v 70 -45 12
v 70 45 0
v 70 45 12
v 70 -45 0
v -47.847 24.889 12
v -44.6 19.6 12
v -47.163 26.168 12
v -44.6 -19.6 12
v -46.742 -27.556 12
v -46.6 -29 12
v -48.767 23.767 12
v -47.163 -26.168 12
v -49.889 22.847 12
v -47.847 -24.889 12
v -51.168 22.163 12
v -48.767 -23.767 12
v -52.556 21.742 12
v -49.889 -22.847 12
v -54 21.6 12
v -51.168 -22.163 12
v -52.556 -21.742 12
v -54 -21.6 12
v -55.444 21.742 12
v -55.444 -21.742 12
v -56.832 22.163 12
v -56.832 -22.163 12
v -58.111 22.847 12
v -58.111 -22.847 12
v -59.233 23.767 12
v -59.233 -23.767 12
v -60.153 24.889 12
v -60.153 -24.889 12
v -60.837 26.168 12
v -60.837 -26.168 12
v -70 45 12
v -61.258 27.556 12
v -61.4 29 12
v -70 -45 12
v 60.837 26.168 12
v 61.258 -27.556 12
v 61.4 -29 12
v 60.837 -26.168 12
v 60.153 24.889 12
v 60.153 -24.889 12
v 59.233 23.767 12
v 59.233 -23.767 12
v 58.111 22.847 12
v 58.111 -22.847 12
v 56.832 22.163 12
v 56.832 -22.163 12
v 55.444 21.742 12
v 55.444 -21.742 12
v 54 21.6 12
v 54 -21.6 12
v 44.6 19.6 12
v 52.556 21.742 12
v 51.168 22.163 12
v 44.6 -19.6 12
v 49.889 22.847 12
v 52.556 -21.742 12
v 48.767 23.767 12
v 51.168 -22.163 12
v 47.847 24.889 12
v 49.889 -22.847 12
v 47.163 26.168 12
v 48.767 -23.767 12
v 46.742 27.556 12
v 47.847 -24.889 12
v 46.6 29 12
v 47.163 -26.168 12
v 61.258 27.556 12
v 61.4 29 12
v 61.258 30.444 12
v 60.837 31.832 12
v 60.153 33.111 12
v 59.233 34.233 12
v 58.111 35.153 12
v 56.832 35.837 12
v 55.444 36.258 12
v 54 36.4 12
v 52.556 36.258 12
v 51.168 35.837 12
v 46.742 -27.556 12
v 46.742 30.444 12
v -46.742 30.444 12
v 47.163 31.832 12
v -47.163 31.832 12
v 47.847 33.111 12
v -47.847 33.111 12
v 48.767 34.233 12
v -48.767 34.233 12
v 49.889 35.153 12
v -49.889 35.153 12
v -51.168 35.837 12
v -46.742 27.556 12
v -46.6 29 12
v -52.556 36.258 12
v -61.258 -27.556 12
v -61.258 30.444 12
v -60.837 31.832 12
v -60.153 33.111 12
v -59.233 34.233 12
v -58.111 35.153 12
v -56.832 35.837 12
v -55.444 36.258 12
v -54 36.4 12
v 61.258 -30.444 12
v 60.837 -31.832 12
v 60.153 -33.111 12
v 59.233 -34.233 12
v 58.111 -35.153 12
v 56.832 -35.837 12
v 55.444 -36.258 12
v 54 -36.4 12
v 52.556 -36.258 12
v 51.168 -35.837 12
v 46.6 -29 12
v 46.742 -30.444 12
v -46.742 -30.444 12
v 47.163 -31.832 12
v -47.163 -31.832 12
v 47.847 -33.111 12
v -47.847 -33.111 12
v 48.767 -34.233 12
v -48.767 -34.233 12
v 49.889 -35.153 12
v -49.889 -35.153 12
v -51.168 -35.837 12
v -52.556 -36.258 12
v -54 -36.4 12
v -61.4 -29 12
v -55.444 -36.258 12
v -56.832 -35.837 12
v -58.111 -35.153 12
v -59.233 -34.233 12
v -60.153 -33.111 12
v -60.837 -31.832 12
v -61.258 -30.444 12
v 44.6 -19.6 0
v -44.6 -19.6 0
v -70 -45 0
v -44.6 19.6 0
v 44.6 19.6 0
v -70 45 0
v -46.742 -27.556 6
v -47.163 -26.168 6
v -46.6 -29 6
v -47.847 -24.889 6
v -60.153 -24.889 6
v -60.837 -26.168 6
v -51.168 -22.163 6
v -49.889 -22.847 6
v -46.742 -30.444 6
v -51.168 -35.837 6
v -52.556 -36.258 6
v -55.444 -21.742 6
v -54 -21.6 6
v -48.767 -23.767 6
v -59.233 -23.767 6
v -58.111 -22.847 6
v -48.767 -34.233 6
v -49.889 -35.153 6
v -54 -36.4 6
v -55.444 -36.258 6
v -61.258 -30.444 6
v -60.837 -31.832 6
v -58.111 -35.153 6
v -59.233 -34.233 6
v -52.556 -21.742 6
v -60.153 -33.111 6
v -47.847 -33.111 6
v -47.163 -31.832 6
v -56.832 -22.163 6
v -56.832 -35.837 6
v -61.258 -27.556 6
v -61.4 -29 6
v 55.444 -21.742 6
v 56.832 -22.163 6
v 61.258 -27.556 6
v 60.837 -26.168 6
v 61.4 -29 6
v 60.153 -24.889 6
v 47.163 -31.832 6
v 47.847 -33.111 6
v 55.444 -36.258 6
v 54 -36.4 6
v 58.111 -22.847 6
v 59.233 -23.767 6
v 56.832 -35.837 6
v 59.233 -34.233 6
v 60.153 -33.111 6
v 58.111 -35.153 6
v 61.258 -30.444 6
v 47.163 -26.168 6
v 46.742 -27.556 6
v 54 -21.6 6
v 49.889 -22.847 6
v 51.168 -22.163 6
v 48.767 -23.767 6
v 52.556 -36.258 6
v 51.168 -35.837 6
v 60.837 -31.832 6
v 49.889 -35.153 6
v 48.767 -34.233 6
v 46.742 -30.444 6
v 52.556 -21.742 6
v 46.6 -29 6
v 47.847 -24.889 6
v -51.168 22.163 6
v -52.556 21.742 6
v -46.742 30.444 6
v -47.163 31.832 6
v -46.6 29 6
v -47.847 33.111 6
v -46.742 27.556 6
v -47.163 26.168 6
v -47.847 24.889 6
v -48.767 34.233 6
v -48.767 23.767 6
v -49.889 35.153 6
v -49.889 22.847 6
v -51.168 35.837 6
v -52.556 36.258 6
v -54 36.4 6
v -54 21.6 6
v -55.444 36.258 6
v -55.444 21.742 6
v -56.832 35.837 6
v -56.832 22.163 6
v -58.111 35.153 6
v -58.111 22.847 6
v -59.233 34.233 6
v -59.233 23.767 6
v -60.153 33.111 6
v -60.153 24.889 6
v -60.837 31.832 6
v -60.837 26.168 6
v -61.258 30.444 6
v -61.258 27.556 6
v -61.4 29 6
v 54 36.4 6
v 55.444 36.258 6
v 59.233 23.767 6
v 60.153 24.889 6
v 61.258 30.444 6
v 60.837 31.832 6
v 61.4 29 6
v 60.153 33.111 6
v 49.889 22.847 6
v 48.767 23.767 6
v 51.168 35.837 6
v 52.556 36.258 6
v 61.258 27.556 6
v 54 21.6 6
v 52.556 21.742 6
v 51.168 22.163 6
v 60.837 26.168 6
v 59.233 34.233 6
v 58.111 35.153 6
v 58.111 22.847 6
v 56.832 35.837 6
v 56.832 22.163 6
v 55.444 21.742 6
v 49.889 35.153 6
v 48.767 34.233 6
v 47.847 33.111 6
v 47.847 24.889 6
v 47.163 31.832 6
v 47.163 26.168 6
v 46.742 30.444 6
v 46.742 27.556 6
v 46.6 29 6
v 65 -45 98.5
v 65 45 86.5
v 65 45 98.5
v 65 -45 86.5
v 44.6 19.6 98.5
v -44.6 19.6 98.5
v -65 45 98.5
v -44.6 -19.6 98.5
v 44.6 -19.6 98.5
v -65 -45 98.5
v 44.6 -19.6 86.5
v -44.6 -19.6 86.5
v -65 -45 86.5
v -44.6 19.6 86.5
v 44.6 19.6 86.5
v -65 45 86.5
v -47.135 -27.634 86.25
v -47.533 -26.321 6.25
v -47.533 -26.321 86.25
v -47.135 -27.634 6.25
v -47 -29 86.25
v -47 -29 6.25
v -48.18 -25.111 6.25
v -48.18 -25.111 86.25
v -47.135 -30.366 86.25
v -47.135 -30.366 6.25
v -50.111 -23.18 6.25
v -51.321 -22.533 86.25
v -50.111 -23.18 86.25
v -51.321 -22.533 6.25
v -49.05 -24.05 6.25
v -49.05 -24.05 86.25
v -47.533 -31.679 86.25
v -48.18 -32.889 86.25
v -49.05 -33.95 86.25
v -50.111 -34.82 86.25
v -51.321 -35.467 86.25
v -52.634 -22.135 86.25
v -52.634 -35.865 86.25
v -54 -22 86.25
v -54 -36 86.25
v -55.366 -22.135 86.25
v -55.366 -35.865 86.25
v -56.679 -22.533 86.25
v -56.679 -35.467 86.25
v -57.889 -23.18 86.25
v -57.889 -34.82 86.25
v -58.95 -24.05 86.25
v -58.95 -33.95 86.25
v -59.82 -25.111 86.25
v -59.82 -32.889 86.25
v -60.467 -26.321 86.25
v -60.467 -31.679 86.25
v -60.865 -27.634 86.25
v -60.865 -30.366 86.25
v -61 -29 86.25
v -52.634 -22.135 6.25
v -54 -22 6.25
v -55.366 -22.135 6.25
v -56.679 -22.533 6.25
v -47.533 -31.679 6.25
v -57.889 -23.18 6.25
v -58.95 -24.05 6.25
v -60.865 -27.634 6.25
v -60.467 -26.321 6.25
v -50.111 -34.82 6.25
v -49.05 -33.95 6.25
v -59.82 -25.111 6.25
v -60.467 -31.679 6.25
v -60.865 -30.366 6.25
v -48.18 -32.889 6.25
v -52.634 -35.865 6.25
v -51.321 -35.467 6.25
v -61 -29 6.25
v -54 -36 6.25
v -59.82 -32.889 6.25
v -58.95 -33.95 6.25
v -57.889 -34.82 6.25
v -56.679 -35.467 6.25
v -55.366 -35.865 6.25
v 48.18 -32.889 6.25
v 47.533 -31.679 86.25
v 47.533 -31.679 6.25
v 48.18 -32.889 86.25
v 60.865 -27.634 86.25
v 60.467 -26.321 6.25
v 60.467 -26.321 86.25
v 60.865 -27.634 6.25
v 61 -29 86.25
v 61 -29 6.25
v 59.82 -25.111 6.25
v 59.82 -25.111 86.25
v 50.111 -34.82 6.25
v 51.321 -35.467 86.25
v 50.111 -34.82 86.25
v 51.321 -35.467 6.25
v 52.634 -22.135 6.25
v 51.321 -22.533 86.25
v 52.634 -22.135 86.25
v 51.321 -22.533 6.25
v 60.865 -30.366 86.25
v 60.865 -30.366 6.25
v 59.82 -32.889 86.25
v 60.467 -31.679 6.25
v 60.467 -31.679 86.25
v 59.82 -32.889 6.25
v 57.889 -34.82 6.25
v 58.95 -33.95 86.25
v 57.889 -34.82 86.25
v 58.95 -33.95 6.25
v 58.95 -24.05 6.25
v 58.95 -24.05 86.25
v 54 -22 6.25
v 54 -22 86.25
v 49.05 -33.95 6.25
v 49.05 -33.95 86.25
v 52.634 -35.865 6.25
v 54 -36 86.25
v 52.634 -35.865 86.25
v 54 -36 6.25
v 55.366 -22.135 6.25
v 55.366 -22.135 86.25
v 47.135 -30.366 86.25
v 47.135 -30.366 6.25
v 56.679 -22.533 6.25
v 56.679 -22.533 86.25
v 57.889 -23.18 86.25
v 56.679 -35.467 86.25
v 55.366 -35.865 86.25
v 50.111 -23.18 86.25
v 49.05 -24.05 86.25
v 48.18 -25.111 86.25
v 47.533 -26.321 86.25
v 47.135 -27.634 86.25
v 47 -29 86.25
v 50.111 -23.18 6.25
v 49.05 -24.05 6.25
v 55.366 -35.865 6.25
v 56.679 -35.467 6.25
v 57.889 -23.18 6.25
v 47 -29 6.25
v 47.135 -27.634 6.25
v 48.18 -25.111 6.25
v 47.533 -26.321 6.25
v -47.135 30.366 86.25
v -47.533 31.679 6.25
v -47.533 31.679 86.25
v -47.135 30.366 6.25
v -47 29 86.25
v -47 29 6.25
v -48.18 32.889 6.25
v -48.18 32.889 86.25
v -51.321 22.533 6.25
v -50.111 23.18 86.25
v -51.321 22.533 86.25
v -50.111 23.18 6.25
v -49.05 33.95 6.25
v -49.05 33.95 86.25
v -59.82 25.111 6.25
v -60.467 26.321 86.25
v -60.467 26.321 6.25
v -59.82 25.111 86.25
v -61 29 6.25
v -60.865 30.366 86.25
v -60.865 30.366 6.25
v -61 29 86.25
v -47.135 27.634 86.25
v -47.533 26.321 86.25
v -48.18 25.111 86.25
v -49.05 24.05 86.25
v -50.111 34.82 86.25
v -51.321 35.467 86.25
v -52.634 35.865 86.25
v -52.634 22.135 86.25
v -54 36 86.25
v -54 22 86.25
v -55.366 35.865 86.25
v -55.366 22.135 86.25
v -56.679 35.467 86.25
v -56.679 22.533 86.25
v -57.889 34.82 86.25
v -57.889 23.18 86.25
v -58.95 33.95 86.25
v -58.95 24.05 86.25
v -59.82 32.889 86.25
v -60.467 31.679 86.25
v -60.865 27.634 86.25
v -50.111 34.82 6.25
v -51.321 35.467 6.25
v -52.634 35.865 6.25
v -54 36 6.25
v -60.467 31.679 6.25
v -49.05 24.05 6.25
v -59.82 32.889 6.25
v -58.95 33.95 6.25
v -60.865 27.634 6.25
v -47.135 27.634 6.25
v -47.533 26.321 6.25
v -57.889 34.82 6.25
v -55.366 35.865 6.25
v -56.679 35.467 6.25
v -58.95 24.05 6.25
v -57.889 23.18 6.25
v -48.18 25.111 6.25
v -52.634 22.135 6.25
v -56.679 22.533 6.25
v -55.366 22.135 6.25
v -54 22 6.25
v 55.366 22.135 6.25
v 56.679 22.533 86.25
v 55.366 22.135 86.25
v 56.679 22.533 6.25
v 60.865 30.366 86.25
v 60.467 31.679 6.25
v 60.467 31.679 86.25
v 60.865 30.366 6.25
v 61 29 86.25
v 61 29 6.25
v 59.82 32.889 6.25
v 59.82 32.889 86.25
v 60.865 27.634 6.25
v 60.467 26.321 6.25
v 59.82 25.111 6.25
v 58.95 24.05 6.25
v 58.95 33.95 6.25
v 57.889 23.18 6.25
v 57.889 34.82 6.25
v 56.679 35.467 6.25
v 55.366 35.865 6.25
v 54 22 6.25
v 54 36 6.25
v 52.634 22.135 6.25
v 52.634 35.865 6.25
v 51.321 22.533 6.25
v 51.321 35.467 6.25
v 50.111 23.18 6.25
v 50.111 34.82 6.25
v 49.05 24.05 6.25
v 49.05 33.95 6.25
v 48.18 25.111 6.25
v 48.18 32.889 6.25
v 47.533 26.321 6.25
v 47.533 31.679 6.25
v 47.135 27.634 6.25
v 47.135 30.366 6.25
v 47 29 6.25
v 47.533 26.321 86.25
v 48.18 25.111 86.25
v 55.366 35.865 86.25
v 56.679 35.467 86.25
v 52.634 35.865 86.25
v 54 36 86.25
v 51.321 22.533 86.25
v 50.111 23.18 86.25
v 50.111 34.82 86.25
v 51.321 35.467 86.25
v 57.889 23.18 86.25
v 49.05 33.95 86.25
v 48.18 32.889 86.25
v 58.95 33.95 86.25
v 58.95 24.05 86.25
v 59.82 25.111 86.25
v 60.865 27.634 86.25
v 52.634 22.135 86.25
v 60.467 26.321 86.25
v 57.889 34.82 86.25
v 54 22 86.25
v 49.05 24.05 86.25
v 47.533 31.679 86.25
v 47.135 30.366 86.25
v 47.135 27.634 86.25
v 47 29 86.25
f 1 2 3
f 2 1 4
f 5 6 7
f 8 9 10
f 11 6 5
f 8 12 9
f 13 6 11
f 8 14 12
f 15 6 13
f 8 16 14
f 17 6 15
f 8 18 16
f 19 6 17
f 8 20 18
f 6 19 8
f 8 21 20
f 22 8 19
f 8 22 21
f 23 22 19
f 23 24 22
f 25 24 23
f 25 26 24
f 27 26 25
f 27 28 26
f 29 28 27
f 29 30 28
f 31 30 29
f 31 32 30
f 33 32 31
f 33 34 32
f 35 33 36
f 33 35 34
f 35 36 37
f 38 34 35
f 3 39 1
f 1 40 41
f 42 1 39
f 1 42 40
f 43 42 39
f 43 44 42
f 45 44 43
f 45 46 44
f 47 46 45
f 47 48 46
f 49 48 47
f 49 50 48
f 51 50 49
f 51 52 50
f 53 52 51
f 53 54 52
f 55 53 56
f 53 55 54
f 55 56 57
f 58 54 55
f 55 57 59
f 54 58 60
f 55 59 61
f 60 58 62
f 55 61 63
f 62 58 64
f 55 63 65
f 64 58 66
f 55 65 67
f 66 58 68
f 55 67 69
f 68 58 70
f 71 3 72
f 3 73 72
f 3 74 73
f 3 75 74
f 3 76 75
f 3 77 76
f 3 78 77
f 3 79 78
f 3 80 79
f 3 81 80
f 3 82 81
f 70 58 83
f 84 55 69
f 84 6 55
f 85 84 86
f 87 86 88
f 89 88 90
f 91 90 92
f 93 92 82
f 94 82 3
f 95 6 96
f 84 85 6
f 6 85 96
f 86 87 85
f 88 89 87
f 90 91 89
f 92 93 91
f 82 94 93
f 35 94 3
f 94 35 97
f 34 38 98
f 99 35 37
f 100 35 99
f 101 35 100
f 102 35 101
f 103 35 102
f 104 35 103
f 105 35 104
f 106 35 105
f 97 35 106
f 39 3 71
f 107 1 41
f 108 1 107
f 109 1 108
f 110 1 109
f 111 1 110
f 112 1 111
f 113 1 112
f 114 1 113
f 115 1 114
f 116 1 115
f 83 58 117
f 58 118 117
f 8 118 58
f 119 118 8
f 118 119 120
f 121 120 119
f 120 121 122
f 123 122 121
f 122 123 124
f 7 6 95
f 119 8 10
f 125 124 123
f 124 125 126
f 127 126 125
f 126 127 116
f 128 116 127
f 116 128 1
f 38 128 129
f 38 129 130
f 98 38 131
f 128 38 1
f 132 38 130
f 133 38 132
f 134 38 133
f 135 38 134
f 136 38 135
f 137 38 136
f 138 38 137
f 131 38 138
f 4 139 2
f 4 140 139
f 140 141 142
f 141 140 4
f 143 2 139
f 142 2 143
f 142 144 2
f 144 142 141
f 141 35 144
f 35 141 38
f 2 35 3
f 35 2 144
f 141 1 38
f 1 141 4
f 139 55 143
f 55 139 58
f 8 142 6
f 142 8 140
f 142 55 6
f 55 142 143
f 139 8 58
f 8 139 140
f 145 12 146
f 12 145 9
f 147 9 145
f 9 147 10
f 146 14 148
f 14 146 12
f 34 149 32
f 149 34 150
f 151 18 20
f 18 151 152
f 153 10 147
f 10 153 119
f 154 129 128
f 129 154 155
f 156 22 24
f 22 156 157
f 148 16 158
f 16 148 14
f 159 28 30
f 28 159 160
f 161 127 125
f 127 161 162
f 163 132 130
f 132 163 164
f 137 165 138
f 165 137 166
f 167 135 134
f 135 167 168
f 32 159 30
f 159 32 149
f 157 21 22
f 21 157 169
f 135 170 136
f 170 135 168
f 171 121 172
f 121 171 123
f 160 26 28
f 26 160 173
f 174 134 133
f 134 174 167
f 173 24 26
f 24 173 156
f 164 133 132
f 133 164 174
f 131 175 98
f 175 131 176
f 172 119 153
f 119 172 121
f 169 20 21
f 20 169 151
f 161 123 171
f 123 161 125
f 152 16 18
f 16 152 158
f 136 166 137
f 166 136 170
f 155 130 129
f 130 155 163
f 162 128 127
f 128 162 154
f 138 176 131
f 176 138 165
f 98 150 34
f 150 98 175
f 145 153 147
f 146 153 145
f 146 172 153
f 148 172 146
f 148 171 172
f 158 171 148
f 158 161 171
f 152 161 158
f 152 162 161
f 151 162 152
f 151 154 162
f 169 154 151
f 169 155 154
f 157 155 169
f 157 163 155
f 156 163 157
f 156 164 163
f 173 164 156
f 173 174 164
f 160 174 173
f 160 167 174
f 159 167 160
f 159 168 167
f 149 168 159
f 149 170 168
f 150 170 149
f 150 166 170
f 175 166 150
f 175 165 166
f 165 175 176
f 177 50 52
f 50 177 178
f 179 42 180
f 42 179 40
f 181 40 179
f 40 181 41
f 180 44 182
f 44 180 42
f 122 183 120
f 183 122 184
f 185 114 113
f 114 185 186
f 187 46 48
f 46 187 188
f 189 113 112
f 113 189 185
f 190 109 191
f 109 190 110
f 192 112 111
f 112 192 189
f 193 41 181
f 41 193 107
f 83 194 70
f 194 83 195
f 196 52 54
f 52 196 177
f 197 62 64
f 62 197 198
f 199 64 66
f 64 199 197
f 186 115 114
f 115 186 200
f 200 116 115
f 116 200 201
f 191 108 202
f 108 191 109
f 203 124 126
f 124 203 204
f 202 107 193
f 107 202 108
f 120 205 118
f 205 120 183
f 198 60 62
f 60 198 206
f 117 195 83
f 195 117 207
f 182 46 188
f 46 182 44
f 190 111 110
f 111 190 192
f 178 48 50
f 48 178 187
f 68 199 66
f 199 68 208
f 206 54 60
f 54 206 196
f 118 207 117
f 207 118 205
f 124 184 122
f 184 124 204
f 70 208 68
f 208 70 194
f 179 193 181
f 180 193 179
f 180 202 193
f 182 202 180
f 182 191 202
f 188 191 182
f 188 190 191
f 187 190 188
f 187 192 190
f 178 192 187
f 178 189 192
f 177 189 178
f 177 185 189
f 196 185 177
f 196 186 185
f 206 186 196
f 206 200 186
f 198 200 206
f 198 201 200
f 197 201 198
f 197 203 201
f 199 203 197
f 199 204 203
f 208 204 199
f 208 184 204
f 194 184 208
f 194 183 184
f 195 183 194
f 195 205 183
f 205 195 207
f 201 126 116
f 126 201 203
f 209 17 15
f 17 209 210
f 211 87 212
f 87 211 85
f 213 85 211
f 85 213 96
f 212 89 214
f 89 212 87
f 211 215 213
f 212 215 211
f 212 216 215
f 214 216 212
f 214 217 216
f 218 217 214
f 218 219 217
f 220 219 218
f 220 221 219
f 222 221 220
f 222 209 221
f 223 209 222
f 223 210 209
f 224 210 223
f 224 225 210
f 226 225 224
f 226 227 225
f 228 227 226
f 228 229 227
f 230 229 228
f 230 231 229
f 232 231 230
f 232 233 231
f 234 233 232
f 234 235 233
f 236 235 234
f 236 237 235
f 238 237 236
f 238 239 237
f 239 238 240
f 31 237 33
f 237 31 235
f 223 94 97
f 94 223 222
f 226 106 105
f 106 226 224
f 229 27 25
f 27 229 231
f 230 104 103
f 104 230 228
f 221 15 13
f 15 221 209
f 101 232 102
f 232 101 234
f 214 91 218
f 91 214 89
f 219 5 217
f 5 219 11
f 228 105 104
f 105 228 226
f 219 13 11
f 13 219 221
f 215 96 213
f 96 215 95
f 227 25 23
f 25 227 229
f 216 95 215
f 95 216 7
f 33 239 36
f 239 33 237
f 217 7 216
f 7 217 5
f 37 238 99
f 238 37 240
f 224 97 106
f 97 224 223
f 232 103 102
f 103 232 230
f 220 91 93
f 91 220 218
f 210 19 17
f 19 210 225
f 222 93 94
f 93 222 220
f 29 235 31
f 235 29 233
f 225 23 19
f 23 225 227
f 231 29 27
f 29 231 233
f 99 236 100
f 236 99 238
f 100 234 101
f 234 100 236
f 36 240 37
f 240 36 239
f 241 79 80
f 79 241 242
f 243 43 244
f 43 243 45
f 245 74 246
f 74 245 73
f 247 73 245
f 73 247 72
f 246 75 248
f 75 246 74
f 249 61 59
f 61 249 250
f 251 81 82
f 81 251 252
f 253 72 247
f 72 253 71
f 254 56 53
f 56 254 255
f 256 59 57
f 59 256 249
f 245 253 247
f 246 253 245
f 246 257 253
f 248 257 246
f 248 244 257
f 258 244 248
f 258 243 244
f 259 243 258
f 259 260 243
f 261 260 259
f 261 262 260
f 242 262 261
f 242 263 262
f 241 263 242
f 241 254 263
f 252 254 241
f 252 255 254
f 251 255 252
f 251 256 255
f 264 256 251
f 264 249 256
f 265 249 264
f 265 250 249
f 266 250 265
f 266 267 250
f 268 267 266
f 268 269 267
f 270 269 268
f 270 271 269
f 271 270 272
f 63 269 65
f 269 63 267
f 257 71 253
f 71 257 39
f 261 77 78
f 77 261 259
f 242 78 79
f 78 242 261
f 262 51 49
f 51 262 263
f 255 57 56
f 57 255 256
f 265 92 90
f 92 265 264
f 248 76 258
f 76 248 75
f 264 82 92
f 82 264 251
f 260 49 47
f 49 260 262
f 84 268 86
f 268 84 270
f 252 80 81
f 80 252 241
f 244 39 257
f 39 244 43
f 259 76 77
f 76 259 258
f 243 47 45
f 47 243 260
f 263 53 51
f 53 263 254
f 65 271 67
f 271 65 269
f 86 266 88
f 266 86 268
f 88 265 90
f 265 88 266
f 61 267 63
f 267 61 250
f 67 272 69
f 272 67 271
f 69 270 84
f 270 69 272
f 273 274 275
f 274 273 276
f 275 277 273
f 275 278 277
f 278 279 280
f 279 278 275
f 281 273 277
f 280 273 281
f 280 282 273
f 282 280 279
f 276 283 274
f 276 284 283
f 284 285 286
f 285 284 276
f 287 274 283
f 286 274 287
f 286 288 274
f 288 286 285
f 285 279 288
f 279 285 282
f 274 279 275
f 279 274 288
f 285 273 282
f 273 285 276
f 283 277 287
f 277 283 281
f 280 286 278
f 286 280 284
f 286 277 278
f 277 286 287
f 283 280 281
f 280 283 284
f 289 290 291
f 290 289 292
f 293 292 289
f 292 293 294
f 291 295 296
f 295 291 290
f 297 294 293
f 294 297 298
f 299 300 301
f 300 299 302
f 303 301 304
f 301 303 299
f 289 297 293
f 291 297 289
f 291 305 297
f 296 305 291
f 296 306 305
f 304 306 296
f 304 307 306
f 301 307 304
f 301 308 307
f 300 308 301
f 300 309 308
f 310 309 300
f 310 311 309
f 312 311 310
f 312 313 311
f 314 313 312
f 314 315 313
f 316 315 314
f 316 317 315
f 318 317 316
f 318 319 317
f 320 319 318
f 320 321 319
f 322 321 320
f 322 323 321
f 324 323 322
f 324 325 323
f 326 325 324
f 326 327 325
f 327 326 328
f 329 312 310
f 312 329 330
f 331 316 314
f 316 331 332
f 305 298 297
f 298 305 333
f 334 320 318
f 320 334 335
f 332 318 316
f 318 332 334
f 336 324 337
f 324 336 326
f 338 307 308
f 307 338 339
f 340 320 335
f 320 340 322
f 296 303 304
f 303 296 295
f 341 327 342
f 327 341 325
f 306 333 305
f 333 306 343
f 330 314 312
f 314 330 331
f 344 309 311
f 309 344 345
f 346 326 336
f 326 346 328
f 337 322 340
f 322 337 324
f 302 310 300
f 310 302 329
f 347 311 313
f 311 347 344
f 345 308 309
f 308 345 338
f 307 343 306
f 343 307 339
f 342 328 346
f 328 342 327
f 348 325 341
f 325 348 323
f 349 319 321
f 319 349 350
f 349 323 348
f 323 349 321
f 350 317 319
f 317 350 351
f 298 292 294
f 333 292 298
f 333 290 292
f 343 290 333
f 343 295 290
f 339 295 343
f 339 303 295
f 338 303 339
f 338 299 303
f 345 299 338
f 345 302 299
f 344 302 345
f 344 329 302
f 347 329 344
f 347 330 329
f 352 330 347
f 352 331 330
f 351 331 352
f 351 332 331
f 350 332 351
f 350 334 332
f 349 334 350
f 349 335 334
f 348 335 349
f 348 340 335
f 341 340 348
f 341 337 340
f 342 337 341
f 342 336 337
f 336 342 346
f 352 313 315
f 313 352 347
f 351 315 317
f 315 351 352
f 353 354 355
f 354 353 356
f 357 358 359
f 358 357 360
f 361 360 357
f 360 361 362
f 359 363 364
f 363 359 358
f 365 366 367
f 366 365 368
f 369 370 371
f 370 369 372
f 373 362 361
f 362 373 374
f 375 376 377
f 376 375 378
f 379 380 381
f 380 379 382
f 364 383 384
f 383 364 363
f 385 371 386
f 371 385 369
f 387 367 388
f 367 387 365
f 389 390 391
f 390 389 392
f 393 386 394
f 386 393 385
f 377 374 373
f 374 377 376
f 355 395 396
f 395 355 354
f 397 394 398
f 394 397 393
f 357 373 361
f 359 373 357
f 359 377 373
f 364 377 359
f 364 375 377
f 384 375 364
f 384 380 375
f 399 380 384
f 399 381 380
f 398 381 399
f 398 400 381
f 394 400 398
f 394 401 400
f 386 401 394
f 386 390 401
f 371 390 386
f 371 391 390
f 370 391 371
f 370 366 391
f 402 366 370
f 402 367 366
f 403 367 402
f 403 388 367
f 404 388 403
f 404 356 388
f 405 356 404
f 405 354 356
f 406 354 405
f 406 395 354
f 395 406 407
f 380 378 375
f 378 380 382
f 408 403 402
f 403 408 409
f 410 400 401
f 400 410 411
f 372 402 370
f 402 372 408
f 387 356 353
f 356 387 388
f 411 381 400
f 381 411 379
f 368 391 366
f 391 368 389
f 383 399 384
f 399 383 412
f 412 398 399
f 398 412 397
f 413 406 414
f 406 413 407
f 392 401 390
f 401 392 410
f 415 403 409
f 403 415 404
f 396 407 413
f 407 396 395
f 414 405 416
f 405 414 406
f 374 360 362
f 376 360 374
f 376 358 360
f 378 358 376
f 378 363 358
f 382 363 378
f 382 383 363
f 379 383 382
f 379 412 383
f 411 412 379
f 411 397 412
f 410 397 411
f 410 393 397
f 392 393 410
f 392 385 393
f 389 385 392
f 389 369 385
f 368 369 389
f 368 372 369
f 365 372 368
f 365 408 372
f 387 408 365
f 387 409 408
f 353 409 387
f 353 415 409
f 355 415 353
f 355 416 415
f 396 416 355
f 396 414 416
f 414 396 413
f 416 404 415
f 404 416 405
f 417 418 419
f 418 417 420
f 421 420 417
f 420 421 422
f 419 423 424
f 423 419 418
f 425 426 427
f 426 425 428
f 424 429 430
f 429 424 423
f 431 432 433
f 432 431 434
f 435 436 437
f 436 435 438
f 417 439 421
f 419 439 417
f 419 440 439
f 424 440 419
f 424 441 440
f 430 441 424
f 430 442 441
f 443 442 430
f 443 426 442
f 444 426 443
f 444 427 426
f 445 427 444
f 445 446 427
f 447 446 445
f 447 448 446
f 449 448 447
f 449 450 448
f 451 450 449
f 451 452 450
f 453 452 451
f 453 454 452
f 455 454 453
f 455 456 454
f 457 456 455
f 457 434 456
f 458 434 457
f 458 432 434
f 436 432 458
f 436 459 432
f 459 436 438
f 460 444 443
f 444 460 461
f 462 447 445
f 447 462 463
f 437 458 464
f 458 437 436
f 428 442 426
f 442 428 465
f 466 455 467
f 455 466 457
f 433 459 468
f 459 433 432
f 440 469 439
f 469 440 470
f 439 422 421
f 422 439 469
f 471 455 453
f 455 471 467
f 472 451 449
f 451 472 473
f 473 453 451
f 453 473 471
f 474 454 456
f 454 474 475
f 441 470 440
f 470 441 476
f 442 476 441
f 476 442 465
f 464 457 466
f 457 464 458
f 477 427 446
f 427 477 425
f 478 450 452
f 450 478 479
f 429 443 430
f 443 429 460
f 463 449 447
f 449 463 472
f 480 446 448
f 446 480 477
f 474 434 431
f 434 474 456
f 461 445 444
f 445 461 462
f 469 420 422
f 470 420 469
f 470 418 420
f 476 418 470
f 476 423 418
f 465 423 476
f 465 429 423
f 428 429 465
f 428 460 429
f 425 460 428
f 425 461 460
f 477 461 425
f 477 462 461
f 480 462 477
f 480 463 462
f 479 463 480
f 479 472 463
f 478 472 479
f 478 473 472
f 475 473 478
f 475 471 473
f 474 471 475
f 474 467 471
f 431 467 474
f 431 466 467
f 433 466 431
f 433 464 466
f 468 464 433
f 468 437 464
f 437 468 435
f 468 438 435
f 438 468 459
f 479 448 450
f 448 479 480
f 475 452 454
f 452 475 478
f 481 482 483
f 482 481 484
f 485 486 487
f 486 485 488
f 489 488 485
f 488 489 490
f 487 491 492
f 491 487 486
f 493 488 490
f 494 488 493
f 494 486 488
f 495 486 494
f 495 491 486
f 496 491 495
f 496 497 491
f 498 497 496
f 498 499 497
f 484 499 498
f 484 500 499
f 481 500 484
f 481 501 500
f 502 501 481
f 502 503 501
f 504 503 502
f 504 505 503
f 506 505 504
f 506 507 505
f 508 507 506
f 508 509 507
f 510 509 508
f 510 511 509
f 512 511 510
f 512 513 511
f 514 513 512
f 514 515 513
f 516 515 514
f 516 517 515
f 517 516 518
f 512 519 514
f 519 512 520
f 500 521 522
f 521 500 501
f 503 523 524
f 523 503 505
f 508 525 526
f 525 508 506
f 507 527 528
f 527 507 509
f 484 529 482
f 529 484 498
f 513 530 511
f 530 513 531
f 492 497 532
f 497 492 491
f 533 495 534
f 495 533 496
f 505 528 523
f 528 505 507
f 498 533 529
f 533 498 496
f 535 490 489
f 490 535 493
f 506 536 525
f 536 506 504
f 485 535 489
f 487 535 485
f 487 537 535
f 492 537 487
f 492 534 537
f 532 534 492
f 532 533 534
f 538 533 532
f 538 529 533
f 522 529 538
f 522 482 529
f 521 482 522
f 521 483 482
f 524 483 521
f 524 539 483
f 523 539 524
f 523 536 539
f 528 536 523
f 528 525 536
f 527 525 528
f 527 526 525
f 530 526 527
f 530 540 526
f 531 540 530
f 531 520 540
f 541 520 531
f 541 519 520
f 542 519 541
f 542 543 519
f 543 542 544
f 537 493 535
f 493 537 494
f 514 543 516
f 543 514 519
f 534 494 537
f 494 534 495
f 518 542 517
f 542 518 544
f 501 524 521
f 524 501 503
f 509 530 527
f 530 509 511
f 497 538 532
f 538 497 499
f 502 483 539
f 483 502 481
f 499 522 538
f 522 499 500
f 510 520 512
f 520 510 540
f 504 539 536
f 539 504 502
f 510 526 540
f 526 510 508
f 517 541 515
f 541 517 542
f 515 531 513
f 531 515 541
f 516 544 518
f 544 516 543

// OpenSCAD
$fn = 32;

// ------------------------------------------------------------------------
// Frame cube: base 140 x 90 mm, posts 80 mm tall
// Every part is its own module, assembly() places every instance.
// ------------------------------------------------------------------------

// --- part 1 ---
module base_frame() {
  difference() {
    translate([-70, -45, 0]) cube([140, 90, 12]);
    translate([-44.6, -19.6, -1]) cube([89.2, 39.2, 14]);
    translate([-54, -29, 6]) cylinder(h = 7, d = 14.8);
    translate([54, -29, 6]) cylinder(h = 7, d = 14.8);
    translate([-54, 29, 6]) cylinder(h = 7, d = 14.8);
    translate([54, 29, 6]) cylinder(h = 7, d = 14.8);
  }
}

// --- part 2 ---
module corner_post() {
  cylinder(h = 80, d = 14);
}

// --- part 3 ---
module top_frame() {
  difference() {
    translate([-65, -45, 0]) cube([130, 90, 12]);
    translate([-44.6, -19.6, -1]) cube([89.2, 39.2, 14]);
  }
}

// --- assembly ---
module assembly() {
  color([0.80, 0.24, 0.20]) translate([0, 0, 0]) rotate([0, 0, 0]) base_frame();
  color([0.20, 0.45, 0.75]) translate([-54, -29, 6.25]) rotate([0, 0, 0]) corner_post();
  color([0.25, 0.62, 0.32]) translate([54, -29, 6.25]) rotate([0, 0, 0]) corner_post();
  color([0.92, 0.70, 0.18]) translate([-54, 29, 6.25]) rotate([0, 0, 0]) corner_post();
  color([0.58, 0.35, 0.70]) translate([54, 29, 6.25]) rotate([0, 0, 0]) corner_post();
  color([0.16, 0.66, 0.66]) translate([0, 0, 86.5]) rotate([0, 0, 0]) top_frame();
}

assembly();
